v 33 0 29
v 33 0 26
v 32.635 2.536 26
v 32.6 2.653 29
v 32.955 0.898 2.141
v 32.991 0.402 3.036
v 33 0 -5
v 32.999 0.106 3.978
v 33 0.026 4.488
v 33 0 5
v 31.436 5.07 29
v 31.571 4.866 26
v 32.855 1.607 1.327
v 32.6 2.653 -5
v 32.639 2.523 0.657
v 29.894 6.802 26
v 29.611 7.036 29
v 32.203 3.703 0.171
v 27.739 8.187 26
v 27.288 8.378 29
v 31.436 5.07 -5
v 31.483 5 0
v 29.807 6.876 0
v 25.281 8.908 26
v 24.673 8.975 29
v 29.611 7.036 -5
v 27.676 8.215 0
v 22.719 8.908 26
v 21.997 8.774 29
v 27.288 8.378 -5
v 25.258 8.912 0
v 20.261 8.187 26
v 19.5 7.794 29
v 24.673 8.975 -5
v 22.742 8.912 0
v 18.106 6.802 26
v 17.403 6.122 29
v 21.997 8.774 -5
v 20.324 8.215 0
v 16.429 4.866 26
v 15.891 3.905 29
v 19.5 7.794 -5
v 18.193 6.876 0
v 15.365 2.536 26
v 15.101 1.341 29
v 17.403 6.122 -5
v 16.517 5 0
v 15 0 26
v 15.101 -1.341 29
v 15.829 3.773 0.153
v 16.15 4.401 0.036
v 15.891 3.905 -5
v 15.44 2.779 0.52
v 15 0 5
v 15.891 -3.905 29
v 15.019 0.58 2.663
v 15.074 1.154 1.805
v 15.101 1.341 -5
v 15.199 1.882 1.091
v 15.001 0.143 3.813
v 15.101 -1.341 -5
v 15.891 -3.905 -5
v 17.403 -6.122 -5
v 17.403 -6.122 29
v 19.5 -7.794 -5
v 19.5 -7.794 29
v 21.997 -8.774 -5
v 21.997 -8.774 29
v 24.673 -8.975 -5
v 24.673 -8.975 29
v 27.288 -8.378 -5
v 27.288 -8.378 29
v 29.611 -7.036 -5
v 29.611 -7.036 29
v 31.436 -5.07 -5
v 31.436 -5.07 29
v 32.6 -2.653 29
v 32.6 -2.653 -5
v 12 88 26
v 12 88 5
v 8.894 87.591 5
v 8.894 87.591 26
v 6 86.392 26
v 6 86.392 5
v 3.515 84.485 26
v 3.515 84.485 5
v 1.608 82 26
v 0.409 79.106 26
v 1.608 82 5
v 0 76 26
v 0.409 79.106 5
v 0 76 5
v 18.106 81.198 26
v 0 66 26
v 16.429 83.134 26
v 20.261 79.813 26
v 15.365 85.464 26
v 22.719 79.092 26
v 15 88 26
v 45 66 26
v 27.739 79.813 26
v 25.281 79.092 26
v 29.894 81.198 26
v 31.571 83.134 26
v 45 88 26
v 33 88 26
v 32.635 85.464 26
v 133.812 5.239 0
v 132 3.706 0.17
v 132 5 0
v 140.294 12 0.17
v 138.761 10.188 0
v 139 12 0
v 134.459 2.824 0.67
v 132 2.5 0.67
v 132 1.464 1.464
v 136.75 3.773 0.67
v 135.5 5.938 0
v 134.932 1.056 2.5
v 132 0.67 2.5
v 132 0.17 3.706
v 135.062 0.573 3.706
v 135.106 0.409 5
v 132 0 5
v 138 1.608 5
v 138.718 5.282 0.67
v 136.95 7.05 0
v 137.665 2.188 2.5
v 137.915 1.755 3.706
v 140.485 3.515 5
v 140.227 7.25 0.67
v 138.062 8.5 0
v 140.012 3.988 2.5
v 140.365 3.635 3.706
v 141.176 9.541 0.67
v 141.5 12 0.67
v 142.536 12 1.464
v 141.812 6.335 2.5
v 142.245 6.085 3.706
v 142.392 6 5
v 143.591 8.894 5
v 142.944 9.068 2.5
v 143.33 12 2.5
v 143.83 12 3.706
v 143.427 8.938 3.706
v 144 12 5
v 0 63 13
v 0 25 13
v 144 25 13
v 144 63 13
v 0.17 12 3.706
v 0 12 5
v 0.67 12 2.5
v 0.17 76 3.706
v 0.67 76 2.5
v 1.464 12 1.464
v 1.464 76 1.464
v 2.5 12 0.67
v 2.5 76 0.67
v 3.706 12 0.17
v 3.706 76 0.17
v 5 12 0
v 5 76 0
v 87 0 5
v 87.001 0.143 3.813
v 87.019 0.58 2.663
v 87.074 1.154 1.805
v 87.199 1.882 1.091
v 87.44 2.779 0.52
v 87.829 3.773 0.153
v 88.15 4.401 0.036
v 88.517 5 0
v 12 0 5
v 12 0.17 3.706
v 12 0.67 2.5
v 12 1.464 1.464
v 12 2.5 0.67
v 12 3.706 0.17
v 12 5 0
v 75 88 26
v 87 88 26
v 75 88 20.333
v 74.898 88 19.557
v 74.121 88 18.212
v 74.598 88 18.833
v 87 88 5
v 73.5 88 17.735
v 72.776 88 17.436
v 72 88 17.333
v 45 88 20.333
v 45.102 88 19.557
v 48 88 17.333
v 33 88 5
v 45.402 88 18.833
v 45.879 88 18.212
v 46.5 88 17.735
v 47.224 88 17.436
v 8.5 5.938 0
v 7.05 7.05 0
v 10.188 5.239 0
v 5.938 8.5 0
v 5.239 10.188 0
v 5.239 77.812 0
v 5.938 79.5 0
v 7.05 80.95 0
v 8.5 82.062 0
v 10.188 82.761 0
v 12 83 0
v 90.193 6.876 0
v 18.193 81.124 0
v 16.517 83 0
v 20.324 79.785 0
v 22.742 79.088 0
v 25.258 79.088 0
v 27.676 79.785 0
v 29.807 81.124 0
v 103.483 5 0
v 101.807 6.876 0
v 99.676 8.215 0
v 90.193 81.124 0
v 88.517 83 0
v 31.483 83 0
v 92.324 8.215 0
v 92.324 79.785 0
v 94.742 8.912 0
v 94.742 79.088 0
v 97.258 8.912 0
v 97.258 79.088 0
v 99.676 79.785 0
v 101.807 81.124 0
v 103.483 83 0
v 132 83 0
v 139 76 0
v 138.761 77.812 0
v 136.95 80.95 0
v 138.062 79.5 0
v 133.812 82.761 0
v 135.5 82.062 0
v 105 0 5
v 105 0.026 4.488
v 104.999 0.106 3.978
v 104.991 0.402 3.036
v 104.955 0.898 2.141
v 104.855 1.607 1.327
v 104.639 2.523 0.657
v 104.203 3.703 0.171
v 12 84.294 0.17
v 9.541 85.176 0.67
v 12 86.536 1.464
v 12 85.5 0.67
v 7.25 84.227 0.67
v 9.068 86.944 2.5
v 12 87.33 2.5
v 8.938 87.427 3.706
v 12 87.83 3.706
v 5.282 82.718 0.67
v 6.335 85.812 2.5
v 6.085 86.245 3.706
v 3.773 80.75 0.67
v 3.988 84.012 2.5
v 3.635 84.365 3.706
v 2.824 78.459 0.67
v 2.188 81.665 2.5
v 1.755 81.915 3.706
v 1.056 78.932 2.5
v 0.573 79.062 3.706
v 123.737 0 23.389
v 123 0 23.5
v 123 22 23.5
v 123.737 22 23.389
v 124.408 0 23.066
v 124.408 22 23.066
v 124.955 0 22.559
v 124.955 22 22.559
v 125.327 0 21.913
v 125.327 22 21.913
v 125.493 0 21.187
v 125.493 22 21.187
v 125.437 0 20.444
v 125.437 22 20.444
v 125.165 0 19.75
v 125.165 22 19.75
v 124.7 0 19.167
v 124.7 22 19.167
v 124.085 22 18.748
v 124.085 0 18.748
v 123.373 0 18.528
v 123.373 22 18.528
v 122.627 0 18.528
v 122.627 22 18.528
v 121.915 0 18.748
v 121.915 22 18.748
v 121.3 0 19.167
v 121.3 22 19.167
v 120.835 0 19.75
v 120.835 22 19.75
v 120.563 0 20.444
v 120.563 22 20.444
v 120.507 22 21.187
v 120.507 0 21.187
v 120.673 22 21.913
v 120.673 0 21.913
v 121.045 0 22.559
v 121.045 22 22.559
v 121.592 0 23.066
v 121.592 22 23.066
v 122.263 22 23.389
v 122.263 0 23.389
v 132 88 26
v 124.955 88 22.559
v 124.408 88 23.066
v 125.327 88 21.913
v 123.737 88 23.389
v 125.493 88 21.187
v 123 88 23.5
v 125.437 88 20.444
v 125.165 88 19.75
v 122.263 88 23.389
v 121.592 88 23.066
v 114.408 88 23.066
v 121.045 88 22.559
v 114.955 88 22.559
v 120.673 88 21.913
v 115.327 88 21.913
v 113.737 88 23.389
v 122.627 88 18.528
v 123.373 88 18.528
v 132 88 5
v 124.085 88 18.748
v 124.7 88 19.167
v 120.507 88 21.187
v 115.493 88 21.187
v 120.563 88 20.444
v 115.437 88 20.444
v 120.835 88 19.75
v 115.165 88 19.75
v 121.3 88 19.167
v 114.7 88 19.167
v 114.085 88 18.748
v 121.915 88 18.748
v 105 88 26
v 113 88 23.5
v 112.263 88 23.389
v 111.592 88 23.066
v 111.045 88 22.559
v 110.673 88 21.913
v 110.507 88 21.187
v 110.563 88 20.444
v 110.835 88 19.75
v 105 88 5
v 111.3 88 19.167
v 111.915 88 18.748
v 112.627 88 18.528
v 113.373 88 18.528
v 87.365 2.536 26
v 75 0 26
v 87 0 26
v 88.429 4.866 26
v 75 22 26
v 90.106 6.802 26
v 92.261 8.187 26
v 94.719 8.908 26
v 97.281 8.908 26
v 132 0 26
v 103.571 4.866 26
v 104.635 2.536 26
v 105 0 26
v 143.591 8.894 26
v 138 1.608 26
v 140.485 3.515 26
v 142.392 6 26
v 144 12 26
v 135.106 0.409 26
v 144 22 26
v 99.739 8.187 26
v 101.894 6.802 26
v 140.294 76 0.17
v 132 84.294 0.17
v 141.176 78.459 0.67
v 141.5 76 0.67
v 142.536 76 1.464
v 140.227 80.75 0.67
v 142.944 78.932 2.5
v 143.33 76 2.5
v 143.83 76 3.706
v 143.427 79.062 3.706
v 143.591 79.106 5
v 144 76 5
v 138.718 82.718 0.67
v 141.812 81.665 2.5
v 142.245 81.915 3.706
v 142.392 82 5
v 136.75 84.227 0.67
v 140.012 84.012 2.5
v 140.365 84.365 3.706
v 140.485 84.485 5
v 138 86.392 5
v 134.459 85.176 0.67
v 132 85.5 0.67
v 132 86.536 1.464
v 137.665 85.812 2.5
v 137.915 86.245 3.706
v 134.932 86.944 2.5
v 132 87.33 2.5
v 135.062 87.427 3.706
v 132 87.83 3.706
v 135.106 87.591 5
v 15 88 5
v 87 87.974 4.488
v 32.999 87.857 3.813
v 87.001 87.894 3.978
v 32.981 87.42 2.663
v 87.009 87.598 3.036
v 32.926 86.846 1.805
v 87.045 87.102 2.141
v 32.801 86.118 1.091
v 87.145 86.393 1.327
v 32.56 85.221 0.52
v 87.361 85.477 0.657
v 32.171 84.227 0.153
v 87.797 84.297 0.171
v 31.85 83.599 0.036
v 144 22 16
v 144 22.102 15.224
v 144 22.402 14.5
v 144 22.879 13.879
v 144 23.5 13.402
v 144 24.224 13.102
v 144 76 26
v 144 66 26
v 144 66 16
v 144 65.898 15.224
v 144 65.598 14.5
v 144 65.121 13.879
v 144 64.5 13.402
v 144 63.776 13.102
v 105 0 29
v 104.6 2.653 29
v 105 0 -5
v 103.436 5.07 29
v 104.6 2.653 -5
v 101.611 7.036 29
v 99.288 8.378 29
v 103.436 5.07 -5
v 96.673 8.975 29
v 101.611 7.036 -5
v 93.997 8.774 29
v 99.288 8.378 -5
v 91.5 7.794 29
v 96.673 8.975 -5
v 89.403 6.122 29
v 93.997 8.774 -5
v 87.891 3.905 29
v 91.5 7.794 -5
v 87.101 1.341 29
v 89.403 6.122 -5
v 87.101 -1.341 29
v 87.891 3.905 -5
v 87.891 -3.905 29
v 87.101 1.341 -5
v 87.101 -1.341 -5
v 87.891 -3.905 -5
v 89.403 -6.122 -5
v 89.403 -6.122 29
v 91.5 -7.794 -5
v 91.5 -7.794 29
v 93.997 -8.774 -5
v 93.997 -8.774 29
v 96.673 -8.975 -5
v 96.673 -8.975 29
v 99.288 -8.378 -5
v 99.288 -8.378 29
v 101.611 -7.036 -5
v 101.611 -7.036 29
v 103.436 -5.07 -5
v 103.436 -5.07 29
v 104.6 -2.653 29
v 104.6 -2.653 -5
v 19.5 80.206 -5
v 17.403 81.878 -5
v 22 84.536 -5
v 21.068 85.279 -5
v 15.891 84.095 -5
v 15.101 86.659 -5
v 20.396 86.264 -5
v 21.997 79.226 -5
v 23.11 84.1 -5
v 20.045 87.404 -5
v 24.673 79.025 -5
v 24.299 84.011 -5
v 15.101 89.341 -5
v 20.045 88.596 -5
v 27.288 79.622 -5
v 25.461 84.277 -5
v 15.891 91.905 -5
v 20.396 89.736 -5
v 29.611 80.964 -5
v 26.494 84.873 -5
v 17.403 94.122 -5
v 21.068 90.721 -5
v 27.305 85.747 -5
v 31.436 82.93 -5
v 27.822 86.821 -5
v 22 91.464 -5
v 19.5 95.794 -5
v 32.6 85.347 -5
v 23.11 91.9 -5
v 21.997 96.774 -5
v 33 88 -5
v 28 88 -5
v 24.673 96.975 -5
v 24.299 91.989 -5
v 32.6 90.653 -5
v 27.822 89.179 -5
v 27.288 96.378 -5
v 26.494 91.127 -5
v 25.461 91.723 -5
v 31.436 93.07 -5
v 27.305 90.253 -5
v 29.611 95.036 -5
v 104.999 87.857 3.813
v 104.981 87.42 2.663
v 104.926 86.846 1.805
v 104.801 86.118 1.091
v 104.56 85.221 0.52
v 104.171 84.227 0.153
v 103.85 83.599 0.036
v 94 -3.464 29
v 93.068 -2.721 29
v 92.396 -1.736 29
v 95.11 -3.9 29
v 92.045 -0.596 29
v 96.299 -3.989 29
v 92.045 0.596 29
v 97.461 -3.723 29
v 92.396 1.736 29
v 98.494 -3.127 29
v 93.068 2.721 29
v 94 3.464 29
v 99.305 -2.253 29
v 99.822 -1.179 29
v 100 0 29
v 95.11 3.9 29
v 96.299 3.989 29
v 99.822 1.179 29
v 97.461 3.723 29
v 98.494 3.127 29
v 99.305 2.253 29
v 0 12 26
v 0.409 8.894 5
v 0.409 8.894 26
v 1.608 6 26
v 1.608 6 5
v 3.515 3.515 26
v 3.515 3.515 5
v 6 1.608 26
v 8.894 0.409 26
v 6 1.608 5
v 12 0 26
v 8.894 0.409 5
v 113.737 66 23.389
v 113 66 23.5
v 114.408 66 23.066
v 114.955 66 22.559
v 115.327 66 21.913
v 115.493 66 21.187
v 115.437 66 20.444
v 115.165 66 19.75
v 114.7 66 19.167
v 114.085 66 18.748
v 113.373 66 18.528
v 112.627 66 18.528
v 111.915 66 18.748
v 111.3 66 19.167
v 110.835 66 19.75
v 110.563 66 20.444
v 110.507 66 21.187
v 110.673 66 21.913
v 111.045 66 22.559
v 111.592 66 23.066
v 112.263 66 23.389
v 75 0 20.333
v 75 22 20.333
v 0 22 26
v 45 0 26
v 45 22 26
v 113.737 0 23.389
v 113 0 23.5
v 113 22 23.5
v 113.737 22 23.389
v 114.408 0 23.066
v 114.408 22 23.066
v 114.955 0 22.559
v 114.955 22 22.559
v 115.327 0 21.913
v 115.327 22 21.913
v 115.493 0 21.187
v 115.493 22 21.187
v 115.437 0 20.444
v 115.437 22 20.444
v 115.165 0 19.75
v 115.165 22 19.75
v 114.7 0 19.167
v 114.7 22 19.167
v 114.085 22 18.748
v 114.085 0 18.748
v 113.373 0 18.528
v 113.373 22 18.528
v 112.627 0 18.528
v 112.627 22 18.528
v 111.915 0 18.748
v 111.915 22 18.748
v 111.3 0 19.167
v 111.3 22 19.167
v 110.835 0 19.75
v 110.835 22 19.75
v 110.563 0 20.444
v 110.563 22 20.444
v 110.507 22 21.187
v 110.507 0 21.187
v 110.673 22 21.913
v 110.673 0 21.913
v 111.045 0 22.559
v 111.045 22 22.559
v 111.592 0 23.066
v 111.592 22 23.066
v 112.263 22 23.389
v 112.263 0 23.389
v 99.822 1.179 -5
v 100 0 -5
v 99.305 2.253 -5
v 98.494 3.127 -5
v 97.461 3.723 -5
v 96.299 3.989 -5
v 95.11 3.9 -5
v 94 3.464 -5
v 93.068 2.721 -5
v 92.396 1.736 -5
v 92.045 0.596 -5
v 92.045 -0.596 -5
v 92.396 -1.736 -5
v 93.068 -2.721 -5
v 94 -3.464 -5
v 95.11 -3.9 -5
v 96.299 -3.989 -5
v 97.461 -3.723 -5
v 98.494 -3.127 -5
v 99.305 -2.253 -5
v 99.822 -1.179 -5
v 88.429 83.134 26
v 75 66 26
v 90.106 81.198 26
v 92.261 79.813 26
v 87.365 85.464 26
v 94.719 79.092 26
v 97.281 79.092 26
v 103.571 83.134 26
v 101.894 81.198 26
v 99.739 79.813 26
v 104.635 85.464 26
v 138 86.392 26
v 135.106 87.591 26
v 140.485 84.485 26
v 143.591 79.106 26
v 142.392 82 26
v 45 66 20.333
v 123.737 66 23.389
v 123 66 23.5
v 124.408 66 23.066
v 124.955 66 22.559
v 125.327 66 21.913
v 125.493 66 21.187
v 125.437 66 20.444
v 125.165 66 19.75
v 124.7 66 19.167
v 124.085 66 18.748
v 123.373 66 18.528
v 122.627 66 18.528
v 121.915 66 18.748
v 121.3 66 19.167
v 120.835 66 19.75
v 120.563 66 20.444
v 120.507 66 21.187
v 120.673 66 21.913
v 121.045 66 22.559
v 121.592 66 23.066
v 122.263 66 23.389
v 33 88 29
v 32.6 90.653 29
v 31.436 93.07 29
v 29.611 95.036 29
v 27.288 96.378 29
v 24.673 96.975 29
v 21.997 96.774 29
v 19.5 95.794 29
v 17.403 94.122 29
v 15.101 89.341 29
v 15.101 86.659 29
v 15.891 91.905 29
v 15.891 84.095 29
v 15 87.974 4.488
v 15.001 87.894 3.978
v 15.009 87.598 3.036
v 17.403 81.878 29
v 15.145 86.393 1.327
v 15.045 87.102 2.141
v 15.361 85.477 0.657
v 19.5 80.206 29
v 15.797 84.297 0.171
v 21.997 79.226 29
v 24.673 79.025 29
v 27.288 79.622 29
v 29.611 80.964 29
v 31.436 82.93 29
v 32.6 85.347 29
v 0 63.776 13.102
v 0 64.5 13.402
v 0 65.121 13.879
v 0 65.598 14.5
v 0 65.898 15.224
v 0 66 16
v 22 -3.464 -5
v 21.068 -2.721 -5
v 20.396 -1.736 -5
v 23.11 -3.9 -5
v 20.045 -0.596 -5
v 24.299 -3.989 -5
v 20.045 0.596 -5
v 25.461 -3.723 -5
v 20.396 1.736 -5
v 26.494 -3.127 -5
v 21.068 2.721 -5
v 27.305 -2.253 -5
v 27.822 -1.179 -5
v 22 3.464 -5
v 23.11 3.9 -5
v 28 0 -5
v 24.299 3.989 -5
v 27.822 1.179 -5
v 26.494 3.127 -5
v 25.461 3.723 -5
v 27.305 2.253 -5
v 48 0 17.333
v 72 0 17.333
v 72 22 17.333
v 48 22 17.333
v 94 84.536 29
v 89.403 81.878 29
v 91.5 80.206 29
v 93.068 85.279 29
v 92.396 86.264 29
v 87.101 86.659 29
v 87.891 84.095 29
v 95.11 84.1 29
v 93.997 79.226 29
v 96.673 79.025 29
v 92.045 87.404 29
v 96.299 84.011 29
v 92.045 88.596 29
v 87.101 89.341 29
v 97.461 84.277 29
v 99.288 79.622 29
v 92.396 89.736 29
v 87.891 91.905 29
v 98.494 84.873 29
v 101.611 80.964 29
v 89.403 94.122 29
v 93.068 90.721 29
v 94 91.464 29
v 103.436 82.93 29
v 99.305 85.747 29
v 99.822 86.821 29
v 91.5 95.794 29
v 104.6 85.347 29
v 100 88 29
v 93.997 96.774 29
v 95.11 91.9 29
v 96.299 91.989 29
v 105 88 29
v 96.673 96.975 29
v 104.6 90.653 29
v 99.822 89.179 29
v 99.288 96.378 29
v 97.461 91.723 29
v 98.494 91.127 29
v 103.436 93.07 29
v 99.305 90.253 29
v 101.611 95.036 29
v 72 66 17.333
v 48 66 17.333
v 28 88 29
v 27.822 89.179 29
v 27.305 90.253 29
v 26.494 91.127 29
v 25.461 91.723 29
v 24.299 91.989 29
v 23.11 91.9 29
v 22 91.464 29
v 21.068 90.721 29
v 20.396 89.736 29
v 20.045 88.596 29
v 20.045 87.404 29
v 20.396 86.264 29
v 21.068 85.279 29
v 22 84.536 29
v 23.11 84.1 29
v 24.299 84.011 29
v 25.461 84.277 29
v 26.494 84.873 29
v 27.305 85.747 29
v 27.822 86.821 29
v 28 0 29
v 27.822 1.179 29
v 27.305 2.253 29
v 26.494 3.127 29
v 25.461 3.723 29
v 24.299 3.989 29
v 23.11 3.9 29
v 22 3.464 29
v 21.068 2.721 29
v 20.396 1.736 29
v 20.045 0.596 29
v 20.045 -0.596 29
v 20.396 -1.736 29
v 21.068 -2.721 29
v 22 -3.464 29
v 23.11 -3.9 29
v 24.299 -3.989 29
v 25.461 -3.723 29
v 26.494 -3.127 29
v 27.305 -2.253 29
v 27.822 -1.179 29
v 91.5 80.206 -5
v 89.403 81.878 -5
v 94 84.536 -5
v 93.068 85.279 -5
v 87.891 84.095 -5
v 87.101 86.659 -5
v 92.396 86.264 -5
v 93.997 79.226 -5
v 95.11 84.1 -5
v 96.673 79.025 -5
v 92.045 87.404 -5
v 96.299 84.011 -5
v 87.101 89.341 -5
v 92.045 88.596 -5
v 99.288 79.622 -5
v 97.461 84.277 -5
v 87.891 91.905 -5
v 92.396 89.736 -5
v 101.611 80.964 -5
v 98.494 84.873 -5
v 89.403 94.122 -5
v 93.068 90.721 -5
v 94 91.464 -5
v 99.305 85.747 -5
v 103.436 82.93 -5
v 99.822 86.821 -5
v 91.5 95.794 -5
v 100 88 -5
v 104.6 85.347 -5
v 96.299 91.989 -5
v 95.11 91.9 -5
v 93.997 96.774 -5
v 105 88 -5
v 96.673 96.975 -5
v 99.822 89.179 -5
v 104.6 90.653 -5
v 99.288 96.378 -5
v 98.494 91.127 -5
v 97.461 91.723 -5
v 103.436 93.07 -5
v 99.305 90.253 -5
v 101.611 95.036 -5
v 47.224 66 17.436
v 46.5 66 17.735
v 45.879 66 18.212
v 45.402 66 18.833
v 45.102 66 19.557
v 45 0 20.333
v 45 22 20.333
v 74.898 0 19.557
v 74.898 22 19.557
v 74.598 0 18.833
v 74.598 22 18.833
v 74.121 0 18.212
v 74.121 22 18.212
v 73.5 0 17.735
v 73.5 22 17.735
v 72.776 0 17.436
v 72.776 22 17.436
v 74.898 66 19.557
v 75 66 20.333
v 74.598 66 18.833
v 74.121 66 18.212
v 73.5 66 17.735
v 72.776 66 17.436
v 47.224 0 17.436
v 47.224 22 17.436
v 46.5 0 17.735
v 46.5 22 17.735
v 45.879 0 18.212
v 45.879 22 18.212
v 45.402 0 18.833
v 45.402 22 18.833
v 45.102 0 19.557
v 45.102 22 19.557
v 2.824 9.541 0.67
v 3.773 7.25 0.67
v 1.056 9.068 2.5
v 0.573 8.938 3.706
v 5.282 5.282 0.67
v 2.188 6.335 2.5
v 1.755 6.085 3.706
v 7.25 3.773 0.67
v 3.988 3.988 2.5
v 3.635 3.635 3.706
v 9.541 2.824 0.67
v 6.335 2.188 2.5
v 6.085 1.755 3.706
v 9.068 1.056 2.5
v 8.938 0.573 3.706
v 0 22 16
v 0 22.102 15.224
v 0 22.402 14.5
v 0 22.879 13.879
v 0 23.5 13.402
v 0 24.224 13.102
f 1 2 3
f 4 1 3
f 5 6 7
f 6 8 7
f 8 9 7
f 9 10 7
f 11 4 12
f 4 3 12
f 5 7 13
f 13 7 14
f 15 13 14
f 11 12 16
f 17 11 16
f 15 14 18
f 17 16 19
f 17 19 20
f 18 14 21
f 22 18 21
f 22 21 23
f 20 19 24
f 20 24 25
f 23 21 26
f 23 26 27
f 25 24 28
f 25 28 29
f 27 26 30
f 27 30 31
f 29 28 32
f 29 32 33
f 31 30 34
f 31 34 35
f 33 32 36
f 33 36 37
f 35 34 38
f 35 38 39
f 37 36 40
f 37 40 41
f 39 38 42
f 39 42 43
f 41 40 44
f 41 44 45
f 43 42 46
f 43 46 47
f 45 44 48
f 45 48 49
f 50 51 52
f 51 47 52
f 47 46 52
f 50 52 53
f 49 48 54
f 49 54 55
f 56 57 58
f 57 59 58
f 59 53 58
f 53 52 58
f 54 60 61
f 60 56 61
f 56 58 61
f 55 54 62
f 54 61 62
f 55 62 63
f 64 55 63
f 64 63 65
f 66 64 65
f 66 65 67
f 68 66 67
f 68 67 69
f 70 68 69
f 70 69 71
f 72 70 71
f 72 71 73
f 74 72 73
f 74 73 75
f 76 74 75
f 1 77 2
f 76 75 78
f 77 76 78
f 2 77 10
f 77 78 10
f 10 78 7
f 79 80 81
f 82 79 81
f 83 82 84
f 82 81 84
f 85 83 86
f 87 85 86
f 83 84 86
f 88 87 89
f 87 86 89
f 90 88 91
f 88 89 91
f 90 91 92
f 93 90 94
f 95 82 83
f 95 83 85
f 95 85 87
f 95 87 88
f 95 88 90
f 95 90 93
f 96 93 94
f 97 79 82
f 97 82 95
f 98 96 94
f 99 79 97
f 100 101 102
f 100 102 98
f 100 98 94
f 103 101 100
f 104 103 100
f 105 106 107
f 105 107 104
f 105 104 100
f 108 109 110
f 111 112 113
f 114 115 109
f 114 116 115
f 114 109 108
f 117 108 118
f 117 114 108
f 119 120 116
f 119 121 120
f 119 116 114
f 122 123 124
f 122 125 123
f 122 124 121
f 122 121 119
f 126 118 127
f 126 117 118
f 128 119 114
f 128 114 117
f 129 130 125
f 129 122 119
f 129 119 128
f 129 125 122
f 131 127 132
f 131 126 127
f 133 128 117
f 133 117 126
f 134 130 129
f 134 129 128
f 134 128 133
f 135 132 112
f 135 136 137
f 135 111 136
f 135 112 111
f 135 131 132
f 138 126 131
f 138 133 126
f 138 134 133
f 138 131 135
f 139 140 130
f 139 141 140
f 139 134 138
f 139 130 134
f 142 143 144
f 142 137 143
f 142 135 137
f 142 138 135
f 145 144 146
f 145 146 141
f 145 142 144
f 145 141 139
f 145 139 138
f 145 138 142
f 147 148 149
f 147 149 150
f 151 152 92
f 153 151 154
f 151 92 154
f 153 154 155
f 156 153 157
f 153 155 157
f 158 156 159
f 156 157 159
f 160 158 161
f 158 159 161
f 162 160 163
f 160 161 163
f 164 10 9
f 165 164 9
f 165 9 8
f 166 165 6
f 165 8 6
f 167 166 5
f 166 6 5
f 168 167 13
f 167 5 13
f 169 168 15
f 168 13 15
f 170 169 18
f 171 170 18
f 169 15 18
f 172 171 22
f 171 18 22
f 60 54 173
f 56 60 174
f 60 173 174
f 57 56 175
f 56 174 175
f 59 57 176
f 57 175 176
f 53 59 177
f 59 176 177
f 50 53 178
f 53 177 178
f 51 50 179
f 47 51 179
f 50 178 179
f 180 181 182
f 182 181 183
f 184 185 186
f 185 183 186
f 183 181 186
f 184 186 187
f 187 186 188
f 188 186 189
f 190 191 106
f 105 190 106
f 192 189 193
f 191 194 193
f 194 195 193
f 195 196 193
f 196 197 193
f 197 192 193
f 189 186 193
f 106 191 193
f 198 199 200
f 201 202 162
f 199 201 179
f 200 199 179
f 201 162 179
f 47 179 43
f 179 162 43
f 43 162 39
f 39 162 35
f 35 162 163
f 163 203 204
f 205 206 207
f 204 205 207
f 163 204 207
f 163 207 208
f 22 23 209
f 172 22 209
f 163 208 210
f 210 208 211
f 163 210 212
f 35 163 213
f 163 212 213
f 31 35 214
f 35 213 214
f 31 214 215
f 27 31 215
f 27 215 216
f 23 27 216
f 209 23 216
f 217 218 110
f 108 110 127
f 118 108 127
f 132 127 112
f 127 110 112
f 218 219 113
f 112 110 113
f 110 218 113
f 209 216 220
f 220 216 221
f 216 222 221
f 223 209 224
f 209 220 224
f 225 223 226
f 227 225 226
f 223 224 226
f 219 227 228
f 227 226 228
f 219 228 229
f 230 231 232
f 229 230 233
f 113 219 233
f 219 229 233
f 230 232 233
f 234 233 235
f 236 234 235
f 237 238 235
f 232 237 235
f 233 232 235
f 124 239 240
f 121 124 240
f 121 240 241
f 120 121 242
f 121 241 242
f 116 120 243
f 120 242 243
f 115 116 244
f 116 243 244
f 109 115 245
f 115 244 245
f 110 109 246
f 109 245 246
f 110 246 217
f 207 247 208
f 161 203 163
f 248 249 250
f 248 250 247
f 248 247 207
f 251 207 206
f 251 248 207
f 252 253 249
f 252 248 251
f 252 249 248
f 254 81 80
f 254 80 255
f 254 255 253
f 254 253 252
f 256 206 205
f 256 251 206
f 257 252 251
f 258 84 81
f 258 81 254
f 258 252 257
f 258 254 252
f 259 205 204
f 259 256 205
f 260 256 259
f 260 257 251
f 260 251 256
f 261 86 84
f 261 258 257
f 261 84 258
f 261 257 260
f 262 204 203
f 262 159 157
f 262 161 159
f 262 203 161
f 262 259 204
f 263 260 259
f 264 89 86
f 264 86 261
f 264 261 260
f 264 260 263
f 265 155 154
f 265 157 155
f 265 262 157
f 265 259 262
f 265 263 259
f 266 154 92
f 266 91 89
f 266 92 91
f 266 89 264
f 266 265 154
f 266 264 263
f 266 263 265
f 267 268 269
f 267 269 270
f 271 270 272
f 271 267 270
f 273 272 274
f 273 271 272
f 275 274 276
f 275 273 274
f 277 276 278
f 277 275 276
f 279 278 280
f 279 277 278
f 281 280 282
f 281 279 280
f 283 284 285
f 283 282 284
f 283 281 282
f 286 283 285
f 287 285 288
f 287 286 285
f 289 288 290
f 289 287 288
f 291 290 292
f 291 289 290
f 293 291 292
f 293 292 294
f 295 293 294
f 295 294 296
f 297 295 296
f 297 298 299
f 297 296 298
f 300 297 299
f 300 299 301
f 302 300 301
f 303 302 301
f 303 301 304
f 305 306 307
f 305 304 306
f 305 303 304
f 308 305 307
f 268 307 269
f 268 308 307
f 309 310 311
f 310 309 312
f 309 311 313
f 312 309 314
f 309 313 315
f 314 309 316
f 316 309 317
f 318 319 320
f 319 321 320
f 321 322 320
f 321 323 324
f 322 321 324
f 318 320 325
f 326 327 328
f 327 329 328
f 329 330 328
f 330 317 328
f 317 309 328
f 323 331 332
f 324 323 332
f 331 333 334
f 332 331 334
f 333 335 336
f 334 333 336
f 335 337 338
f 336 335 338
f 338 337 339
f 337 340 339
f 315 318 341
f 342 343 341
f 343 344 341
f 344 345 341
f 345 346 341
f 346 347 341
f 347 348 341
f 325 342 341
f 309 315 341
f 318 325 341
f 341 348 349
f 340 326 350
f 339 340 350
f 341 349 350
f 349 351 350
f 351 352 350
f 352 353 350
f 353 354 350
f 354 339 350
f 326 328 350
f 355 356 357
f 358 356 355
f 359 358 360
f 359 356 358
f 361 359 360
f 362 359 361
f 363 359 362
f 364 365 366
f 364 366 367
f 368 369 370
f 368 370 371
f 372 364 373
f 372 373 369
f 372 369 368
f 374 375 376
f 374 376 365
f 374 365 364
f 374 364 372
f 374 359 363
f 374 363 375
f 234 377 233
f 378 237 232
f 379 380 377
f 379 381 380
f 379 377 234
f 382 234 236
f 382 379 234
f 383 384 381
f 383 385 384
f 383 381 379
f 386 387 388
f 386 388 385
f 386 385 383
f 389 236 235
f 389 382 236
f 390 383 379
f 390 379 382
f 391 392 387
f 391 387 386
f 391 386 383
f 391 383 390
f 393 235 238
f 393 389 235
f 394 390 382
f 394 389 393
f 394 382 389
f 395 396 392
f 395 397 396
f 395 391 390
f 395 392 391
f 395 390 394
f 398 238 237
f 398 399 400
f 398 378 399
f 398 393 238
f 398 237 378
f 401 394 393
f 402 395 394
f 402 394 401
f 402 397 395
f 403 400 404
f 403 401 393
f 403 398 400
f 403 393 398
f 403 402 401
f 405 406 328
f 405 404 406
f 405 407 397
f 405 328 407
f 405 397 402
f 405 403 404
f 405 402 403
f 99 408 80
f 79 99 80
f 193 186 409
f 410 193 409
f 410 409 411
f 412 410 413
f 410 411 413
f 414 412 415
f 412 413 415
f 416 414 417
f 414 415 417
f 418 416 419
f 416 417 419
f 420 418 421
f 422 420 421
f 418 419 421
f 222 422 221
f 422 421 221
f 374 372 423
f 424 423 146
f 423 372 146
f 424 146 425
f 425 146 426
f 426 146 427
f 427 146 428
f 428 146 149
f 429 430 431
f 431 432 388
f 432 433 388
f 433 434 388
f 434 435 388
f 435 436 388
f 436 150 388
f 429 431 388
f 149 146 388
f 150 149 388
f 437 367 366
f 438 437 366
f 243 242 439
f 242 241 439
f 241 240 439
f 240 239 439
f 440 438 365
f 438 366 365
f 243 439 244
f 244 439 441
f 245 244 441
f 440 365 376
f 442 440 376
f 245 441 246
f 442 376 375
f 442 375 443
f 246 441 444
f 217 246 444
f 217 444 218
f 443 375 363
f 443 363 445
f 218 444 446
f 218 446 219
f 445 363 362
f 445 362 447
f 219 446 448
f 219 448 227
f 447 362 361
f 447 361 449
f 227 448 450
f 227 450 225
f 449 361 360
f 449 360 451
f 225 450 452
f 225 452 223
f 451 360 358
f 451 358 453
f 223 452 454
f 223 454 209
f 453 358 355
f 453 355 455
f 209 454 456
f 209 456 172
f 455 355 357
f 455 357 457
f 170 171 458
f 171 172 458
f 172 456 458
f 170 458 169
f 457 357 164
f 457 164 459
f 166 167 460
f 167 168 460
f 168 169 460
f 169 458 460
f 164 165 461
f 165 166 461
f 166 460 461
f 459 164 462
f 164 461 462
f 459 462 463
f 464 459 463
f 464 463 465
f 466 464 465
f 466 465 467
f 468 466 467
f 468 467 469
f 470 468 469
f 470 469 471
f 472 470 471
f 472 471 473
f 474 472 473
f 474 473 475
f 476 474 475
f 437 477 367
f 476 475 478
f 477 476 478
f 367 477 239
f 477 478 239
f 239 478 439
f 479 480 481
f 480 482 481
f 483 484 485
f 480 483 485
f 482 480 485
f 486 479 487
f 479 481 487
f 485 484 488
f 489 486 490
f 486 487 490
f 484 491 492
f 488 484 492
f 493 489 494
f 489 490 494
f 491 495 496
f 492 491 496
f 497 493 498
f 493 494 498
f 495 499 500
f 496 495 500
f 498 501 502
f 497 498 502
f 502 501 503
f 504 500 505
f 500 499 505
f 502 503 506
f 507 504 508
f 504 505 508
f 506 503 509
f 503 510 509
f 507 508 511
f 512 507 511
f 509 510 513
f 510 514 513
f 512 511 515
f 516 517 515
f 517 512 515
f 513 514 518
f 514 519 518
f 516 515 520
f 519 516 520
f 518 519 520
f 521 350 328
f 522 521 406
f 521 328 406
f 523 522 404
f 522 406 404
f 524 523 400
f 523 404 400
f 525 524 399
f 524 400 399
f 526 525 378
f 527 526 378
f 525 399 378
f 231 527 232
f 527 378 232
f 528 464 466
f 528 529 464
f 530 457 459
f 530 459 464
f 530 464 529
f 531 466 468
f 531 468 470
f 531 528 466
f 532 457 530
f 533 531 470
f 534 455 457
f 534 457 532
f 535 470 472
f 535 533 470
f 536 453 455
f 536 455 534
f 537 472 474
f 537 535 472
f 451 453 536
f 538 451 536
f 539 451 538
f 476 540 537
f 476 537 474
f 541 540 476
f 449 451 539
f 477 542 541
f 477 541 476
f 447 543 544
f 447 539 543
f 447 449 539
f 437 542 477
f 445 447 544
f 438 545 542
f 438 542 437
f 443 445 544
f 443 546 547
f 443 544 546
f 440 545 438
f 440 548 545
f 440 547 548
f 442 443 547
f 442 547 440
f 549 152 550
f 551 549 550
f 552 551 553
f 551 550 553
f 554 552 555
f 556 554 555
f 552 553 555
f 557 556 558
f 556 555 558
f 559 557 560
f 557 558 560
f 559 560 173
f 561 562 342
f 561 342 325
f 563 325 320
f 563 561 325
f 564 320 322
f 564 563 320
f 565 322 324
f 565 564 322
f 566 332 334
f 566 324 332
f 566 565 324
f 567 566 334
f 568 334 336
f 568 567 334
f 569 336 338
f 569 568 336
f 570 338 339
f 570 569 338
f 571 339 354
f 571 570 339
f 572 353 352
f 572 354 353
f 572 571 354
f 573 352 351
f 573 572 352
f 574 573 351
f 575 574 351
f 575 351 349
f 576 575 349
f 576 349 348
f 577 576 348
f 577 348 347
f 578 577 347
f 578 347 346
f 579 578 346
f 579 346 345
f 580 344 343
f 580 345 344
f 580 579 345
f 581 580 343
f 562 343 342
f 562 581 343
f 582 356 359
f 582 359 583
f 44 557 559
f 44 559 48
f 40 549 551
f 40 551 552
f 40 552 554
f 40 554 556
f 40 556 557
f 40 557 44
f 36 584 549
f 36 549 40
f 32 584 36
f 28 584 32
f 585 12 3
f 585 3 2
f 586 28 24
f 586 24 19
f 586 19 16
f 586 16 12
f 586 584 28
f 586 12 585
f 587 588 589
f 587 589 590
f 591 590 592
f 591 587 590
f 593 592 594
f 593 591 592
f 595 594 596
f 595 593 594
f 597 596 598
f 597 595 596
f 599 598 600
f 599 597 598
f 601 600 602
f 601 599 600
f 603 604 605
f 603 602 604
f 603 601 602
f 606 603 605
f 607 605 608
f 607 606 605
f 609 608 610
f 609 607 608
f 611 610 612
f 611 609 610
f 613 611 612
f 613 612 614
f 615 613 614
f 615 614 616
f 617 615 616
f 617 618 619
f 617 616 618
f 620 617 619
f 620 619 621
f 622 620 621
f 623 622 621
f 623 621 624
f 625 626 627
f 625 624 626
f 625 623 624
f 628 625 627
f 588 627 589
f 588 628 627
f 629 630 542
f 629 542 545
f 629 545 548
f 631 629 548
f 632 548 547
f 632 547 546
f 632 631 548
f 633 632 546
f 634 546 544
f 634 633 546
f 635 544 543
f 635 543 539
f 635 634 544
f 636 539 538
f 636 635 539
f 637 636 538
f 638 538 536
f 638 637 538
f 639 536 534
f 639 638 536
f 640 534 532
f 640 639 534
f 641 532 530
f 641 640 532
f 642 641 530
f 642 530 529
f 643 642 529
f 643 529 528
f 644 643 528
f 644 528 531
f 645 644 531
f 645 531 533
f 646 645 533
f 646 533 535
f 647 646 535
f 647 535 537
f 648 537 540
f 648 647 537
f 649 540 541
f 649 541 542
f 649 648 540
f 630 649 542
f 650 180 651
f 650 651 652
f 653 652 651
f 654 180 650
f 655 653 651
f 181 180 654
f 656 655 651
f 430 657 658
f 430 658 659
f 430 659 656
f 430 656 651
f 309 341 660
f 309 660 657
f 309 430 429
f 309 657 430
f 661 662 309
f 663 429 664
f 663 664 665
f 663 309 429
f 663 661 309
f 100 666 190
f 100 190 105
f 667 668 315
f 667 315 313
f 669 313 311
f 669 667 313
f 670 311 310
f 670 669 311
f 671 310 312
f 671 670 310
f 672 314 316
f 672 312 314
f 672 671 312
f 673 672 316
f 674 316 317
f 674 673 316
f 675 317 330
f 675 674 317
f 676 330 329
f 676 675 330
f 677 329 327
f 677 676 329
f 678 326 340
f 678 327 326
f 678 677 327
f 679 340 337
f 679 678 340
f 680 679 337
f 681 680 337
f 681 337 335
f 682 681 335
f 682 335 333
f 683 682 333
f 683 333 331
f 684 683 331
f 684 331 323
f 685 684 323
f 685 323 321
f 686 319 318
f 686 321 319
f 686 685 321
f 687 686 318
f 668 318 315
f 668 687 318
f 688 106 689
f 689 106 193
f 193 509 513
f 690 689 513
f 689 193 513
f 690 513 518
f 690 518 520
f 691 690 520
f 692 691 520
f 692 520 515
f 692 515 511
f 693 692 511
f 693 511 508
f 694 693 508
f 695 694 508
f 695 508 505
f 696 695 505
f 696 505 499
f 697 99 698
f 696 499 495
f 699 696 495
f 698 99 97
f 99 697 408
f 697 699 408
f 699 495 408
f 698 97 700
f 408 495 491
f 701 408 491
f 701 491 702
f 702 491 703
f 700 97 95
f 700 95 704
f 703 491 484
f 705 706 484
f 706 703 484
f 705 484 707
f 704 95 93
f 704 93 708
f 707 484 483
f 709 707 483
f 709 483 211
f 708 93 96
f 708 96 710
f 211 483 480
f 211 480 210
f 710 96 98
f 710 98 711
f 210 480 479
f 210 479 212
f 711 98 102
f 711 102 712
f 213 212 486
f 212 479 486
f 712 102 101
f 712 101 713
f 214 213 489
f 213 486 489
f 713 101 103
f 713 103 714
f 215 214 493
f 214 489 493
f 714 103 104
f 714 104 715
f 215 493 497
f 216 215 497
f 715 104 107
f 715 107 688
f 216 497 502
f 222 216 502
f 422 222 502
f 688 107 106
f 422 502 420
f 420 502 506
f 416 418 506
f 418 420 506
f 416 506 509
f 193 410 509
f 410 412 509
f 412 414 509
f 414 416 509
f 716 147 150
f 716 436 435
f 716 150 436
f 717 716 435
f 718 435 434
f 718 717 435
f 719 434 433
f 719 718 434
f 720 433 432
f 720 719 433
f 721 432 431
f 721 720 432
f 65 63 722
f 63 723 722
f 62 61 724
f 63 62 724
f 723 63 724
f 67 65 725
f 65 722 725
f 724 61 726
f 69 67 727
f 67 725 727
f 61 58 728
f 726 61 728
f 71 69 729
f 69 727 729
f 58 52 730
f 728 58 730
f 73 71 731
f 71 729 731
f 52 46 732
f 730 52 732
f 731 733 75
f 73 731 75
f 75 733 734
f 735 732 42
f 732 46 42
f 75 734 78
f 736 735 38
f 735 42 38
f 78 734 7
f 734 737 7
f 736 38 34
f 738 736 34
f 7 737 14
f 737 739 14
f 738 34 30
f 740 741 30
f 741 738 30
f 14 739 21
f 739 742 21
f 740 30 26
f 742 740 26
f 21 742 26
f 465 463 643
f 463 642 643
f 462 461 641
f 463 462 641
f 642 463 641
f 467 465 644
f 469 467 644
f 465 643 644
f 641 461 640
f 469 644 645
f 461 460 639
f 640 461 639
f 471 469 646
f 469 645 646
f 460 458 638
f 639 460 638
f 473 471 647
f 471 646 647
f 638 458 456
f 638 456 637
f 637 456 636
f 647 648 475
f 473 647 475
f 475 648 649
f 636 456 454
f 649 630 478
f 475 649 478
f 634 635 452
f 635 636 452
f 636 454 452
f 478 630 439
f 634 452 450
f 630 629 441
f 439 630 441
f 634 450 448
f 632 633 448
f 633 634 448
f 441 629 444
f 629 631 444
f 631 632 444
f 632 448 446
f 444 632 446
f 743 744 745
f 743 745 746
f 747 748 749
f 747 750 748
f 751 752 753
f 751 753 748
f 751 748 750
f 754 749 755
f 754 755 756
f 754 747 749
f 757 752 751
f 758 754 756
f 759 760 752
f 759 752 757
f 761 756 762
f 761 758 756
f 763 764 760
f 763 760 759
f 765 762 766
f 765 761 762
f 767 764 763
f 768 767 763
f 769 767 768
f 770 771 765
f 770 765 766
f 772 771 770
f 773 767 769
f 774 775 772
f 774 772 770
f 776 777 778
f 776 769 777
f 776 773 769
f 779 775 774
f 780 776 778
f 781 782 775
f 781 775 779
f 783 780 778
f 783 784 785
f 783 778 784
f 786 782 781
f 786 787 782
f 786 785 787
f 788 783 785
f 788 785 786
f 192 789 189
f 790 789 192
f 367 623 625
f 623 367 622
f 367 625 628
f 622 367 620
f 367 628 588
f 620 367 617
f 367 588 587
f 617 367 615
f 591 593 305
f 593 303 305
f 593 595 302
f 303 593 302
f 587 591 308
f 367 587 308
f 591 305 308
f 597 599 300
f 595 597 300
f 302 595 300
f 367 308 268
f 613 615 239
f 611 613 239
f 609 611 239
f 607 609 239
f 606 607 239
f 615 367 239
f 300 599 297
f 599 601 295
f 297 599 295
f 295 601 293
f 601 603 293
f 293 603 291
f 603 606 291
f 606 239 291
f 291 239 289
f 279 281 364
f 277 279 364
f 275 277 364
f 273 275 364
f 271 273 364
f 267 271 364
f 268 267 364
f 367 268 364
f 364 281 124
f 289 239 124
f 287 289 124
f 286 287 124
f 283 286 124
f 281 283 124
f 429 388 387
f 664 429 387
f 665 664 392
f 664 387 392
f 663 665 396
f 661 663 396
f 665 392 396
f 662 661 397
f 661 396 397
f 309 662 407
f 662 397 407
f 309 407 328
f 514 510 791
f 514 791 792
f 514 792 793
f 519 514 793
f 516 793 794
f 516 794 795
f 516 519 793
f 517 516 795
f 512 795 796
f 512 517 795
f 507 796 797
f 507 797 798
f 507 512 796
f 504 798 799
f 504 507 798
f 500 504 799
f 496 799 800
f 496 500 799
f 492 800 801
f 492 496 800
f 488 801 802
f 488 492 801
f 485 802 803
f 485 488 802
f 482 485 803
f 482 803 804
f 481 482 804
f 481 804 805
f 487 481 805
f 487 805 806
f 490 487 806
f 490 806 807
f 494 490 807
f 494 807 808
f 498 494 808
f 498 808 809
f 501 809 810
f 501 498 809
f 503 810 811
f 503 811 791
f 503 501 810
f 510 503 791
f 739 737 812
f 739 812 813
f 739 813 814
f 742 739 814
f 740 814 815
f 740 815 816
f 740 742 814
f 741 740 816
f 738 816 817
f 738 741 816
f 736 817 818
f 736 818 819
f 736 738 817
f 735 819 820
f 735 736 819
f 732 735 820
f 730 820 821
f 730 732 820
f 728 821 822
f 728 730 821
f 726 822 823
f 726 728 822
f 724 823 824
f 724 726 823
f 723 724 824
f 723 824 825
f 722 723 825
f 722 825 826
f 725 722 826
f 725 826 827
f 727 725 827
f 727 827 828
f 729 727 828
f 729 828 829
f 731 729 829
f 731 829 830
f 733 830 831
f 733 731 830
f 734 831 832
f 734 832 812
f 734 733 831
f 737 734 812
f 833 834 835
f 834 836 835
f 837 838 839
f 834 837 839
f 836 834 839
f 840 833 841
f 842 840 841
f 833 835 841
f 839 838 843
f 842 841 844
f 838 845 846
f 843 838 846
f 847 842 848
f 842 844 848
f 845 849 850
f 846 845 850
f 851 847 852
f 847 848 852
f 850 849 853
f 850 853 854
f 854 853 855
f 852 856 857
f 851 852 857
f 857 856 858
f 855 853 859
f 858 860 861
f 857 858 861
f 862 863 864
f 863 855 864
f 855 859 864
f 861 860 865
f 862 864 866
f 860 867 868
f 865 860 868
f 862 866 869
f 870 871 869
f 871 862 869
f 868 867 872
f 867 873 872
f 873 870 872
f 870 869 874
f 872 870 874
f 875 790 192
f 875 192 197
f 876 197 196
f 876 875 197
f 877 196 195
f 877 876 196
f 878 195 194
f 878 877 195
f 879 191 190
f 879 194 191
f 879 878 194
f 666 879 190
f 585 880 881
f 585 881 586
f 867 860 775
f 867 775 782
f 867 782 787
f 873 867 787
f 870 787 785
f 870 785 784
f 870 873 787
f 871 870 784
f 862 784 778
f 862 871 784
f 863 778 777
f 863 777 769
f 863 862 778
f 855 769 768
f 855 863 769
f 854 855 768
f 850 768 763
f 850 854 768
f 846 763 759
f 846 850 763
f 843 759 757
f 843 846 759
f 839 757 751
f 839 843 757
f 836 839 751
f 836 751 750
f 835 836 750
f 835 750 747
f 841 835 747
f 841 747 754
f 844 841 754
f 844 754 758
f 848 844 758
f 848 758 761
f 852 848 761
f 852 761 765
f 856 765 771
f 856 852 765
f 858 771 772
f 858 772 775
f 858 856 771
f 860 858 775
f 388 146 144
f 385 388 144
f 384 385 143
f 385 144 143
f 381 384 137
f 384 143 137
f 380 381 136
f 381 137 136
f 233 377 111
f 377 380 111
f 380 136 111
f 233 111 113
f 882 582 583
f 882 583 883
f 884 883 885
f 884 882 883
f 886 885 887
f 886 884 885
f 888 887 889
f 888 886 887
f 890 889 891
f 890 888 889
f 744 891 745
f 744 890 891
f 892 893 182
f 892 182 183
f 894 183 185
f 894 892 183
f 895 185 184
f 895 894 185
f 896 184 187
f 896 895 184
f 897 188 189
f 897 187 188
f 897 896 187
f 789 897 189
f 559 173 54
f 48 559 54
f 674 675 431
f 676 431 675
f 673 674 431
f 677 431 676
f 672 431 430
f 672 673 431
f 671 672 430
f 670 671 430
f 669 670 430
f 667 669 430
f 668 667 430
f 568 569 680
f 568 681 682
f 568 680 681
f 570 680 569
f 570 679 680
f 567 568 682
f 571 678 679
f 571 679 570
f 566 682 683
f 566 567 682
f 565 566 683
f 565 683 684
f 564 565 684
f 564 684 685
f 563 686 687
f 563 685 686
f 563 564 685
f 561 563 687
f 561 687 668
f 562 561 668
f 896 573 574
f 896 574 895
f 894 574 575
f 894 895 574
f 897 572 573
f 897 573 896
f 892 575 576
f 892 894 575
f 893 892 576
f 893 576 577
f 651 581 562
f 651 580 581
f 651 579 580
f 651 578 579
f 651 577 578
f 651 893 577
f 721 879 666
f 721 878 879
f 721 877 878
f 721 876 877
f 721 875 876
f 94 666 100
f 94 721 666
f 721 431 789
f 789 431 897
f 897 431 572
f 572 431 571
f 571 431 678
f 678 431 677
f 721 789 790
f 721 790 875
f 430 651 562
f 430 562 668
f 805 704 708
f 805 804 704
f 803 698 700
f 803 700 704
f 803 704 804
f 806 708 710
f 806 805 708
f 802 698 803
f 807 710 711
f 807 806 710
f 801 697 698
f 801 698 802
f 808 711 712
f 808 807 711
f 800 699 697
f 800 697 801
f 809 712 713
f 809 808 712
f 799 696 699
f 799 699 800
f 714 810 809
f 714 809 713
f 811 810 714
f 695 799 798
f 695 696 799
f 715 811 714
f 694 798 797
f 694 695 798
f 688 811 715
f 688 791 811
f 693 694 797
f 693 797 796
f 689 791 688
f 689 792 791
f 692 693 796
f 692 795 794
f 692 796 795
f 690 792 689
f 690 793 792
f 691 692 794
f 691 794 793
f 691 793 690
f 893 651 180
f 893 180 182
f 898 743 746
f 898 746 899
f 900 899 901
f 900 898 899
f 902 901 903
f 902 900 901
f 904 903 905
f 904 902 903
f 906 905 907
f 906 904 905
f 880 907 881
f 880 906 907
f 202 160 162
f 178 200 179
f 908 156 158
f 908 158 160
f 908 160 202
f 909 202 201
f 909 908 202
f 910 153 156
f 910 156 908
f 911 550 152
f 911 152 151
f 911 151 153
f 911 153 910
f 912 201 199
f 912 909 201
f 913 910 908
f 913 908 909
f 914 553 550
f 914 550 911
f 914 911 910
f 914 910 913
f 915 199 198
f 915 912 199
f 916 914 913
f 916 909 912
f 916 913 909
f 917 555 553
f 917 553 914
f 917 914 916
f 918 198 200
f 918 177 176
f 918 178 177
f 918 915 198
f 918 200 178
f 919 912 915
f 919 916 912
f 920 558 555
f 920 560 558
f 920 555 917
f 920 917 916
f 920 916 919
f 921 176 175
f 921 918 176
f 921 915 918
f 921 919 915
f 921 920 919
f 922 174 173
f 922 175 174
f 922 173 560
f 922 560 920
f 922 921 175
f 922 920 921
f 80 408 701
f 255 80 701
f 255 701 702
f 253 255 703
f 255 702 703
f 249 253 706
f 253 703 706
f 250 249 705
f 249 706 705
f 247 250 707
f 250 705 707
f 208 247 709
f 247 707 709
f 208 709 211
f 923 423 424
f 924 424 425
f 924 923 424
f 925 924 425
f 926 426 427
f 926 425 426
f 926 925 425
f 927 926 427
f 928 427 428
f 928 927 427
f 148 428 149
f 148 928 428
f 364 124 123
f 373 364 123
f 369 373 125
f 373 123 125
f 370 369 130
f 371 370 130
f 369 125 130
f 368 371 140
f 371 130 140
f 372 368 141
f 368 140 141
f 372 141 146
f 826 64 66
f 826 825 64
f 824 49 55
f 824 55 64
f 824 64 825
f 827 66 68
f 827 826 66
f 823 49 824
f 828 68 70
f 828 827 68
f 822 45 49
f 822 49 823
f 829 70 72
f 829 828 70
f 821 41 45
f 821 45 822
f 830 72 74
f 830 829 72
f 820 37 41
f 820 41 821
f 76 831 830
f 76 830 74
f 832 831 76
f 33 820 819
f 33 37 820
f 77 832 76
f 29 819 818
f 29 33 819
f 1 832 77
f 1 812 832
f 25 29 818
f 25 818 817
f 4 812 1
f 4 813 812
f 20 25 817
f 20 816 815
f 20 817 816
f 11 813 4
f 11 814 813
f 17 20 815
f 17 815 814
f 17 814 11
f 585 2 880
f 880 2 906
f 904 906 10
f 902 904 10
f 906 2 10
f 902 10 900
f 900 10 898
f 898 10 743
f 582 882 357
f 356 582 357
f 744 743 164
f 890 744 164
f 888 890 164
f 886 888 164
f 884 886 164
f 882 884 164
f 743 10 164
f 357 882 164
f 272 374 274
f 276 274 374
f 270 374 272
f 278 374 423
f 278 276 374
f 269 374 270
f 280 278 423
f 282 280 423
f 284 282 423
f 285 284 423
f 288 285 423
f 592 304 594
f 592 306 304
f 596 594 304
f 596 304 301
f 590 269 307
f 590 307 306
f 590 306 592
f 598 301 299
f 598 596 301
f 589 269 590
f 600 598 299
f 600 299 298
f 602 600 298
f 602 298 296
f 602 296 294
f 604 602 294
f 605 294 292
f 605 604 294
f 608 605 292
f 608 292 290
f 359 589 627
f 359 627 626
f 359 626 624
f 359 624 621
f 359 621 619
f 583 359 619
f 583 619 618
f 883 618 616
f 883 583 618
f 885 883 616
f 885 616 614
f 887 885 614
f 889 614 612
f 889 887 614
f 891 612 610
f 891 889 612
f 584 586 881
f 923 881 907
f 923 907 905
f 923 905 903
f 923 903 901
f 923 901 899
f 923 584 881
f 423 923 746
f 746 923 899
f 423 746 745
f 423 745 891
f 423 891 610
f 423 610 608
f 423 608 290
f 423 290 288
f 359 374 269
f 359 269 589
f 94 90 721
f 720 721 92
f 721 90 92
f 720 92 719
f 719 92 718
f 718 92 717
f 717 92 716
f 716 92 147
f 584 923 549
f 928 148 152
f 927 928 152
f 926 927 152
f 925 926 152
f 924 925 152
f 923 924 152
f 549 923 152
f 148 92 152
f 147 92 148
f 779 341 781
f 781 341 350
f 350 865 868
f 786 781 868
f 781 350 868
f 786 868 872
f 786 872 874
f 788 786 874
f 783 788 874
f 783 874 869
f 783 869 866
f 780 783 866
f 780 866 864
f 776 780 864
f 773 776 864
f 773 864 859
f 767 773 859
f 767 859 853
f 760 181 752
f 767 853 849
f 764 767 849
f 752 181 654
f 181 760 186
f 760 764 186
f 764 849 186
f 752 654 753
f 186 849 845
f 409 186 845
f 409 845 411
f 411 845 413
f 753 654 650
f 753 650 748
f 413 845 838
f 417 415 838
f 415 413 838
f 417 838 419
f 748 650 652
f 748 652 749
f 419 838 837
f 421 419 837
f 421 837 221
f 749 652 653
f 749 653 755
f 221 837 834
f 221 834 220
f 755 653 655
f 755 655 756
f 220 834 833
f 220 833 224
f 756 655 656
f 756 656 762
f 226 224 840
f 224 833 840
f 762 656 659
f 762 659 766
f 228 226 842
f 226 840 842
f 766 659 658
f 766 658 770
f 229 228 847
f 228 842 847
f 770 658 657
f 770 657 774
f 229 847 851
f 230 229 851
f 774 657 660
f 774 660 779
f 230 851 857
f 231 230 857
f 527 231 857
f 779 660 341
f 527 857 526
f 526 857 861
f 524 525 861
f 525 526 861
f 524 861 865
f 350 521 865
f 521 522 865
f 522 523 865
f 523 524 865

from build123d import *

# Parameters (mm, degrees)
SKETCH1_W               = 72
SKETCH1_H               = 40
BOSS_EXTRUDE1_DEPTH     = 26
BOSS_EXTRUDE3_START     = -5
SKETCH1_4_R             = 9
SKETCH1_4_R_2           = 4
BOSS_EXTRUDE3_DEPTH     = 34
CUT_EXTRUDE2_DEPTH      = 177.028406798
CUT_EXTRUDE2_DEPTH_BACK = 177.028406798
CUT_EXTRUDE3_DEPTH      = 177.028406798
CUT_EXTRUDE3_DEPTH_BACK = 177.028406798
SKETCH3_R               = 2.5
FILLET1_R               = 5


with BuildPart() as part:
    # Sketch1 → Boss-Extrude1 (new body)
    # profile 1 of 2: a face of its own
    with BuildSketch(Plane.XY):
        with BuildLine():
            Line((87, 88), (33, 88))
            ThreePointArc((33, 88), (24, 79), (15, 88))
            Line((15, 88), (12, 88))
            ThreePointArc((12, 88), (3.514718626, 84.485281374), (0, 76))
            Line((0, 76), (0, 12))
            ThreePointArc((0, 12), (3.514718626, 3.514718626), (12, 0))
            Line((12, 0), (15, 0))
            ThreePointArc((15, 0), (24, 9), (33, 0))
            Line((33, 0), (87, 0))
            ThreePointArc((87, 0), (96, 9), (105, 0))
            Line((105, 0), (132, 0))
            ThreePointArc((132, 0), (140.485281374, 3.514718626), (144, 12))
            Line((144, 12), (144, 76))
            ThreePointArc((144, 76), (140.485281374, 84.485281374), (132, 88))
            Line((132, 88), (105, 88))
            ThreePointArc((105, 88), (96, 79), (87, 88))
        make_face()
        with Locations((72, 44)):
            Rectangle(SKETCH1_W, SKETCH1_H, mode=Mode.SUBTRACT)
    # profile 2 of 2: a face of its own
    with BuildSketch(Plane.XY):
        with Locations((72, 44)):
            Rectangle(SKETCH1_W, SKETCH1_H)
    extrude(amount=BOSS_EXTRUDE1_DEPTH)

    # Sketch1<4> → Boss-Extrude3 (add)
    # profile 1 of 4: a face of its own
    with BuildSketch(Plane.XY.offset(BOSS_EXTRUDE3_START)):
        with Locations((24, 88)):
            Circle(SKETCH1_4_R)
        with Locations((24, 88)):
            Circle(SKETCH1_4_R_2, mode=Mode.SUBTRACT)
    # profile 2 of 4: a face of its own
    with BuildSketch(Plane.XY.offset(BOSS_EXTRUDE3_START)):
        with Locations((96, 88)):
            Circle(SKETCH1_4_R)
        with Locations((96, 88)):
            Circle(SKETCH1_4_R_2, mode=Mode.SUBTRACT)
    # profile 3 of 4: a face of its own
    with BuildSketch(Plane.XY.offset(BOSS_EXTRUDE3_START)):
        with Locations((96, 0)):
            Circle(SKETCH1_4_R)
        with Locations((96, 0)):
            Circle(SKETCH1_4_R_2, mode=Mode.SUBTRACT)
    # profile 4 of 4: a face of its own
    with BuildSketch(Plane.XY.offset(BOSS_EXTRUDE3_START)):
        with Locations((24, 0)):
            Circle(SKETCH1_4_R)
        with Locations((24, 0)):
            Circle(SKETCH1_4_R_2, mode=Mode.SUBTRACT)
    extrude(amount=BOSS_EXTRUDE3_DEPTH)

    # Sketch2 → Cut-Extrude2 (cut, two sides: drawn at the far end of the back side and taken through both)
    with BuildSketch(Plane(origin=(0, 0, 0), x_dir=(0, 0, -1), z_dir=(1, 0, 0)).offset(-CUT_EXTRUDE2_DEPTH_BACK)):
        with BuildLine():
            Line((-13, 25), (-13, 63))
            ThreePointArc((-13, 63), (-13.878679656, 65.121320344), (-16, 66))
            Line((-16, 66), (-26, 66))
            Line((-26, 66), (-26, 22))
            Line((-26, 22), (-16, 22))
            ThreePointArc((-16, 22), (-13.878679656, 22.878679656), (-13, 25))
        make_face()
    extrude(amount=CUT_EXTRUDE2_DEPTH + CUT_EXTRUDE2_DEPTH_BACK, mode=Mode.SUBTRACT)

    # Sketch3 → Cut-Extrude3 (cut, two sides: drawn at the far end of the back side and taken through both)
    with BuildSketch(Plane(origin=(0, 0, 0), x_dir=(1, 0, 0), z_dir=(0, 1, 0)).offset(-CUT_EXTRUDE3_DEPTH_BACK)):
        with Locations(Location((113, -21, 0), (0, 0, 270))):
            Circle(SKETCH3_R)
        with Locations(Location((123, -21, 0), (0, 0, 270))):
            Circle(SKETCH3_R)
        with BuildLine():
            Line((72, -17.333333333), (48, -17.333333333))
            ThreePointArc((48, -17.333333333), (45.878679656, -18.21201299), (45, -20.333333333))
            Line((45, -20.333333333), (45, -26))
            Line((45, -26), (75, -26))
            Line((75, -26), (75, -20.333333333))
            ThreePointArc((75, -20.333333333), (74.121320344, -18.21201299), (72, -17.333333333))
        make_face()
    extrude(amount=CUT_EXTRUDE3_DEPTH + CUT_EXTRUDE3_DEPTH_BACK, mode=Mode.SUBTRACT)

    # Fillet1
    # the kernel refuses this fillet: 5 mm, written as the material it takes off along each edge
    with BuildSketch(Plane(origin=(27.5, 88, 0), x_dir=(0, -1, 0), z_dir=(-1, 0, 0))) as fillet1_piece_1_section:
        with BuildLine():
            CenterArc((FILLET1_R, FILLET1_R), FILLET1_R, 180, 90)
            Line((0, FILLET1_R), (0, 0))
            Line((0, 0), (FILLET1_R, 0))
        make_face()
    fillet1_piece_1 = extrude(amount=15.5, mode=Mode.PRIVATE)
    fillet1_piece_1 = fillet1_piece_1 - Plane(origin=(24, 88, 2.038539575), x_dir=(1, 0, 0), z_dir=(0, 0, -1)) * Cylinder(9, 51, mode=Mode.PRIVATE)
    add(fillet1_piece_1, mode=Mode.SUBTRACT)
    with BuildSketch(Plane(origin=(99.5, 88, 0), x_dir=(0, -1, 0), z_dir=(-1, 0, 0))) as fillet1_piece_2_section:
        with BuildLine():
            CenterArc((FILLET1_R, FILLET1_R), FILLET1_R, 180, 90)
            Line((0, FILLET1_R), (0, 0))
            Line((0, 0), (FILLET1_R, 0))
        make_face()
    fillet1_piece_2 = extrude(amount=79, mode=Mode.PRIVATE)
    fillet1_piece_2 = fillet1_piece_2 - Plane(origin=(24, 88, 1.113779656), x_dir=(1, 0, 0), z_dir=(0, 0, -1)) * Cylinder(9, 178, mode=Mode.PRIVATE)
    fillet1_piece_2 = fillet1_piece_2 - Plane(origin=(96, 88, 1.113779656), x_dir=(1, 0, 0), z_dir=(0, 0, -1)) * Cylinder(9, 178, mode=Mode.PRIVATE)
    add(fillet1_piece_2, mode=Mode.SUBTRACT)
    with BuildSketch(Plane(origin=(132, 88, 0), x_dir=(0, -1, 0), z_dir=(-1, 0, 0))) as fillet1_piece_3_section:
        with BuildLine():
            CenterArc((FILLET1_R, FILLET1_R), FILLET1_R, 180, 90)
            Line((0, FILLET1_R), (0, 0))
            Line((0, 0), (FILLET1_R, 0))
        make_face()
    fillet1_piece_3 = extrude(amount=39.5, mode=Mode.PRIVATE)
    fillet1_piece_3 = fillet1_piece_3 - Plane(origin=(96, 88, 0.84758794), x_dir=(1, 0, 0), z_dir=(0, 0, -1)) * Cylinder(9, 99, mode=Mode.PRIVATE)
    add(fillet1_piece_3, mode=Mode.SUBTRACT)
    with BuildSketch(Plane(origin=(132, 76, 0), x_dir=(1, 0, 0), z_dir=(0, -1, 0))) as fillet1_piece_4:
        with BuildLine():
            CenterArc((12 - FILLET1_R, FILLET1_R), FILLET1_R, 270, 90)
            Line((12, FILLET1_R), (12, 0))
            Line((12, 0), (12 - FILLET1_R, 0))
        make_face()
    revolve(axis=Axis((132, 76, 0), (0, 0, 1)), revolution_arc=90, mode=Mode.SUBTRACT)
    with BuildSketch(Plane(origin=(144, 12, 0), x_dir=(-1, 0, 0), z_dir=(0, 1, 0)), Plane(origin=(0, 76, 0), x_dir=(1, 0, 0), z_dir=(0, -1, 0))) as fillet1_piece_5:
        with BuildLine():
            CenterArc((FILLET1_R, FILLET1_R), FILLET1_R, 180, 90)
            Line((0, FILLET1_R), (0, 0))
            Line((0, 0), (FILLET1_R, 0))
        make_face()
    extrude(amount=64, mode=Mode.SUBTRACT)
    with BuildSketch(Plane(origin=(132, 12, 0), x_dir=(0, -1, 0), z_dir=(-1, 0, 0))) as fillet1_piece_6:
        with BuildLine():
            CenterArc((12 - FILLET1_R, FILLET1_R), FILLET1_R, 270, 90)
            Line((12, FILLET1_R), (12, 0))
            Line((12, 0), (12 - FILLET1_R, 0))
        make_face()
    revolve(axis=Axis((132, 12, 0), (0, 0, 1)), revolution_arc=90, mode=Mode.SUBTRACT)
    with BuildSketch(Plane(origin=(92.5, 0, 0), x_dir=(0, 1, 0), z_dir=(1, 0, 0))) as fillet1_piece_7_section:
        with BuildLine():
            CenterArc((FILLET1_R, FILLET1_R), FILLET1_R, 180, 90)
            Line((0, FILLET1_R), (0, 0))
            Line((0, 0), (FILLET1_R, 0))
        make_face()
    fillet1_piece_7 = extrude(amount=39.5, mode=Mode.PRIVATE)
    fillet1_piece_7 = fillet1_piece_7 - Plane(origin=(96, 0, 1.166964438), x_dir=(1, 0, 0), z_dir=(0, 0, -1)) * Cylinder(9, 99, mode=Mode.PRIVATE)
    add(fillet1_piece_7, mode=Mode.SUBTRACT)
    with BuildSketch(Plane(origin=(20.5, 0, 0), x_dir=(0, 1, 0), z_dir=(1, 0, 0))) as fillet1_piece_8_section:
        with BuildLine():
            CenterArc((FILLET1_R, FILLET1_R), FILLET1_R, 180, 90)
            Line((0, FILLET1_R), (0, 0))
            Line((0, 0), (FILLET1_R, 0))
        make_face()
    fillet1_piece_8 = extrude(amount=79, mode=Mode.PRIVATE)
    fillet1_piece_8 = fillet1_piece_8 - Plane(origin=(96, 0, 1.113779656), x_dir=(1, 0, 0), z_dir=(0, 0, -1)) * Cylinder(9, 178, mode=Mode.PRIVATE)
    fillet1_piece_8 = fillet1_piece_8 - Plane(origin=(24, 0, 1.113779656), x_dir=(1, 0, 0), z_dir=(0, 0, -1)) * Cylinder(9, 178, mode=Mode.PRIVATE)
    add(fillet1_piece_8, mode=Mode.SUBTRACT)
    with BuildSketch(Plane(origin=(12, 0, 0), x_dir=(0, 1, 0), z_dir=(1, 0, 0))) as fillet1_piece_9_section:
        with BuildLine():
            CenterArc((FILLET1_R, FILLET1_R), FILLET1_R, 180, 90)
            Line((0, FILLET1_R), (0, 0))
            Line((0, 0), (FILLET1_R, 0))
        make_face()
    fillet1_piece_9 = extrude(amount=15.5, mode=Mode.PRIVATE)
    fillet1_piece_9 = fillet1_piece_9 - Plane(origin=(24, 0, 0.994853316), x_dir=(1, 0, 0), z_dir=(0, 0, -1)) * Cylinder(9, 51, mode=Mode.PRIVATE)
    add(fillet1_piece_9, mode=Mode.SUBTRACT)
    with BuildSketch(Plane(origin=(12, 12, 0), x_dir=(-1, 0, 0), z_dir=(0, 1, 0))) as fillet1_piece_10:
        with BuildLine():
            CenterArc((12 - FILLET1_R, FILLET1_R), FILLET1_R, 270, 90)
            Line((12, FILLET1_R), (12, 0))
            Line((12, 0), (12 - FILLET1_R, 0))
        make_face()
    revolve(axis=Axis((12, 12, 0), (0, 0, 1)), revolution_arc=90, mode=Mode.SUBTRACT)
    with BuildSketch(Plane(origin=(12, 76, 0), x_dir=(0, 1, 0), z_dir=(1, 0, 0))) as fillet1_piece_11:
        with BuildLine():
            CenterArc((12 - FILLET1_R, FILLET1_R), FILLET1_R, 270, 90)
            Line((12, FILLET1_R), (12, 0))
            Line((12, 0), (12 - FILLET1_R, 0))
        make_face()
    revolve(axis=Axis((12, 76, 0), (0, 0, 1)), revolution_arc=90, mode=Mode.SUBTRACT)


solid = part.part
